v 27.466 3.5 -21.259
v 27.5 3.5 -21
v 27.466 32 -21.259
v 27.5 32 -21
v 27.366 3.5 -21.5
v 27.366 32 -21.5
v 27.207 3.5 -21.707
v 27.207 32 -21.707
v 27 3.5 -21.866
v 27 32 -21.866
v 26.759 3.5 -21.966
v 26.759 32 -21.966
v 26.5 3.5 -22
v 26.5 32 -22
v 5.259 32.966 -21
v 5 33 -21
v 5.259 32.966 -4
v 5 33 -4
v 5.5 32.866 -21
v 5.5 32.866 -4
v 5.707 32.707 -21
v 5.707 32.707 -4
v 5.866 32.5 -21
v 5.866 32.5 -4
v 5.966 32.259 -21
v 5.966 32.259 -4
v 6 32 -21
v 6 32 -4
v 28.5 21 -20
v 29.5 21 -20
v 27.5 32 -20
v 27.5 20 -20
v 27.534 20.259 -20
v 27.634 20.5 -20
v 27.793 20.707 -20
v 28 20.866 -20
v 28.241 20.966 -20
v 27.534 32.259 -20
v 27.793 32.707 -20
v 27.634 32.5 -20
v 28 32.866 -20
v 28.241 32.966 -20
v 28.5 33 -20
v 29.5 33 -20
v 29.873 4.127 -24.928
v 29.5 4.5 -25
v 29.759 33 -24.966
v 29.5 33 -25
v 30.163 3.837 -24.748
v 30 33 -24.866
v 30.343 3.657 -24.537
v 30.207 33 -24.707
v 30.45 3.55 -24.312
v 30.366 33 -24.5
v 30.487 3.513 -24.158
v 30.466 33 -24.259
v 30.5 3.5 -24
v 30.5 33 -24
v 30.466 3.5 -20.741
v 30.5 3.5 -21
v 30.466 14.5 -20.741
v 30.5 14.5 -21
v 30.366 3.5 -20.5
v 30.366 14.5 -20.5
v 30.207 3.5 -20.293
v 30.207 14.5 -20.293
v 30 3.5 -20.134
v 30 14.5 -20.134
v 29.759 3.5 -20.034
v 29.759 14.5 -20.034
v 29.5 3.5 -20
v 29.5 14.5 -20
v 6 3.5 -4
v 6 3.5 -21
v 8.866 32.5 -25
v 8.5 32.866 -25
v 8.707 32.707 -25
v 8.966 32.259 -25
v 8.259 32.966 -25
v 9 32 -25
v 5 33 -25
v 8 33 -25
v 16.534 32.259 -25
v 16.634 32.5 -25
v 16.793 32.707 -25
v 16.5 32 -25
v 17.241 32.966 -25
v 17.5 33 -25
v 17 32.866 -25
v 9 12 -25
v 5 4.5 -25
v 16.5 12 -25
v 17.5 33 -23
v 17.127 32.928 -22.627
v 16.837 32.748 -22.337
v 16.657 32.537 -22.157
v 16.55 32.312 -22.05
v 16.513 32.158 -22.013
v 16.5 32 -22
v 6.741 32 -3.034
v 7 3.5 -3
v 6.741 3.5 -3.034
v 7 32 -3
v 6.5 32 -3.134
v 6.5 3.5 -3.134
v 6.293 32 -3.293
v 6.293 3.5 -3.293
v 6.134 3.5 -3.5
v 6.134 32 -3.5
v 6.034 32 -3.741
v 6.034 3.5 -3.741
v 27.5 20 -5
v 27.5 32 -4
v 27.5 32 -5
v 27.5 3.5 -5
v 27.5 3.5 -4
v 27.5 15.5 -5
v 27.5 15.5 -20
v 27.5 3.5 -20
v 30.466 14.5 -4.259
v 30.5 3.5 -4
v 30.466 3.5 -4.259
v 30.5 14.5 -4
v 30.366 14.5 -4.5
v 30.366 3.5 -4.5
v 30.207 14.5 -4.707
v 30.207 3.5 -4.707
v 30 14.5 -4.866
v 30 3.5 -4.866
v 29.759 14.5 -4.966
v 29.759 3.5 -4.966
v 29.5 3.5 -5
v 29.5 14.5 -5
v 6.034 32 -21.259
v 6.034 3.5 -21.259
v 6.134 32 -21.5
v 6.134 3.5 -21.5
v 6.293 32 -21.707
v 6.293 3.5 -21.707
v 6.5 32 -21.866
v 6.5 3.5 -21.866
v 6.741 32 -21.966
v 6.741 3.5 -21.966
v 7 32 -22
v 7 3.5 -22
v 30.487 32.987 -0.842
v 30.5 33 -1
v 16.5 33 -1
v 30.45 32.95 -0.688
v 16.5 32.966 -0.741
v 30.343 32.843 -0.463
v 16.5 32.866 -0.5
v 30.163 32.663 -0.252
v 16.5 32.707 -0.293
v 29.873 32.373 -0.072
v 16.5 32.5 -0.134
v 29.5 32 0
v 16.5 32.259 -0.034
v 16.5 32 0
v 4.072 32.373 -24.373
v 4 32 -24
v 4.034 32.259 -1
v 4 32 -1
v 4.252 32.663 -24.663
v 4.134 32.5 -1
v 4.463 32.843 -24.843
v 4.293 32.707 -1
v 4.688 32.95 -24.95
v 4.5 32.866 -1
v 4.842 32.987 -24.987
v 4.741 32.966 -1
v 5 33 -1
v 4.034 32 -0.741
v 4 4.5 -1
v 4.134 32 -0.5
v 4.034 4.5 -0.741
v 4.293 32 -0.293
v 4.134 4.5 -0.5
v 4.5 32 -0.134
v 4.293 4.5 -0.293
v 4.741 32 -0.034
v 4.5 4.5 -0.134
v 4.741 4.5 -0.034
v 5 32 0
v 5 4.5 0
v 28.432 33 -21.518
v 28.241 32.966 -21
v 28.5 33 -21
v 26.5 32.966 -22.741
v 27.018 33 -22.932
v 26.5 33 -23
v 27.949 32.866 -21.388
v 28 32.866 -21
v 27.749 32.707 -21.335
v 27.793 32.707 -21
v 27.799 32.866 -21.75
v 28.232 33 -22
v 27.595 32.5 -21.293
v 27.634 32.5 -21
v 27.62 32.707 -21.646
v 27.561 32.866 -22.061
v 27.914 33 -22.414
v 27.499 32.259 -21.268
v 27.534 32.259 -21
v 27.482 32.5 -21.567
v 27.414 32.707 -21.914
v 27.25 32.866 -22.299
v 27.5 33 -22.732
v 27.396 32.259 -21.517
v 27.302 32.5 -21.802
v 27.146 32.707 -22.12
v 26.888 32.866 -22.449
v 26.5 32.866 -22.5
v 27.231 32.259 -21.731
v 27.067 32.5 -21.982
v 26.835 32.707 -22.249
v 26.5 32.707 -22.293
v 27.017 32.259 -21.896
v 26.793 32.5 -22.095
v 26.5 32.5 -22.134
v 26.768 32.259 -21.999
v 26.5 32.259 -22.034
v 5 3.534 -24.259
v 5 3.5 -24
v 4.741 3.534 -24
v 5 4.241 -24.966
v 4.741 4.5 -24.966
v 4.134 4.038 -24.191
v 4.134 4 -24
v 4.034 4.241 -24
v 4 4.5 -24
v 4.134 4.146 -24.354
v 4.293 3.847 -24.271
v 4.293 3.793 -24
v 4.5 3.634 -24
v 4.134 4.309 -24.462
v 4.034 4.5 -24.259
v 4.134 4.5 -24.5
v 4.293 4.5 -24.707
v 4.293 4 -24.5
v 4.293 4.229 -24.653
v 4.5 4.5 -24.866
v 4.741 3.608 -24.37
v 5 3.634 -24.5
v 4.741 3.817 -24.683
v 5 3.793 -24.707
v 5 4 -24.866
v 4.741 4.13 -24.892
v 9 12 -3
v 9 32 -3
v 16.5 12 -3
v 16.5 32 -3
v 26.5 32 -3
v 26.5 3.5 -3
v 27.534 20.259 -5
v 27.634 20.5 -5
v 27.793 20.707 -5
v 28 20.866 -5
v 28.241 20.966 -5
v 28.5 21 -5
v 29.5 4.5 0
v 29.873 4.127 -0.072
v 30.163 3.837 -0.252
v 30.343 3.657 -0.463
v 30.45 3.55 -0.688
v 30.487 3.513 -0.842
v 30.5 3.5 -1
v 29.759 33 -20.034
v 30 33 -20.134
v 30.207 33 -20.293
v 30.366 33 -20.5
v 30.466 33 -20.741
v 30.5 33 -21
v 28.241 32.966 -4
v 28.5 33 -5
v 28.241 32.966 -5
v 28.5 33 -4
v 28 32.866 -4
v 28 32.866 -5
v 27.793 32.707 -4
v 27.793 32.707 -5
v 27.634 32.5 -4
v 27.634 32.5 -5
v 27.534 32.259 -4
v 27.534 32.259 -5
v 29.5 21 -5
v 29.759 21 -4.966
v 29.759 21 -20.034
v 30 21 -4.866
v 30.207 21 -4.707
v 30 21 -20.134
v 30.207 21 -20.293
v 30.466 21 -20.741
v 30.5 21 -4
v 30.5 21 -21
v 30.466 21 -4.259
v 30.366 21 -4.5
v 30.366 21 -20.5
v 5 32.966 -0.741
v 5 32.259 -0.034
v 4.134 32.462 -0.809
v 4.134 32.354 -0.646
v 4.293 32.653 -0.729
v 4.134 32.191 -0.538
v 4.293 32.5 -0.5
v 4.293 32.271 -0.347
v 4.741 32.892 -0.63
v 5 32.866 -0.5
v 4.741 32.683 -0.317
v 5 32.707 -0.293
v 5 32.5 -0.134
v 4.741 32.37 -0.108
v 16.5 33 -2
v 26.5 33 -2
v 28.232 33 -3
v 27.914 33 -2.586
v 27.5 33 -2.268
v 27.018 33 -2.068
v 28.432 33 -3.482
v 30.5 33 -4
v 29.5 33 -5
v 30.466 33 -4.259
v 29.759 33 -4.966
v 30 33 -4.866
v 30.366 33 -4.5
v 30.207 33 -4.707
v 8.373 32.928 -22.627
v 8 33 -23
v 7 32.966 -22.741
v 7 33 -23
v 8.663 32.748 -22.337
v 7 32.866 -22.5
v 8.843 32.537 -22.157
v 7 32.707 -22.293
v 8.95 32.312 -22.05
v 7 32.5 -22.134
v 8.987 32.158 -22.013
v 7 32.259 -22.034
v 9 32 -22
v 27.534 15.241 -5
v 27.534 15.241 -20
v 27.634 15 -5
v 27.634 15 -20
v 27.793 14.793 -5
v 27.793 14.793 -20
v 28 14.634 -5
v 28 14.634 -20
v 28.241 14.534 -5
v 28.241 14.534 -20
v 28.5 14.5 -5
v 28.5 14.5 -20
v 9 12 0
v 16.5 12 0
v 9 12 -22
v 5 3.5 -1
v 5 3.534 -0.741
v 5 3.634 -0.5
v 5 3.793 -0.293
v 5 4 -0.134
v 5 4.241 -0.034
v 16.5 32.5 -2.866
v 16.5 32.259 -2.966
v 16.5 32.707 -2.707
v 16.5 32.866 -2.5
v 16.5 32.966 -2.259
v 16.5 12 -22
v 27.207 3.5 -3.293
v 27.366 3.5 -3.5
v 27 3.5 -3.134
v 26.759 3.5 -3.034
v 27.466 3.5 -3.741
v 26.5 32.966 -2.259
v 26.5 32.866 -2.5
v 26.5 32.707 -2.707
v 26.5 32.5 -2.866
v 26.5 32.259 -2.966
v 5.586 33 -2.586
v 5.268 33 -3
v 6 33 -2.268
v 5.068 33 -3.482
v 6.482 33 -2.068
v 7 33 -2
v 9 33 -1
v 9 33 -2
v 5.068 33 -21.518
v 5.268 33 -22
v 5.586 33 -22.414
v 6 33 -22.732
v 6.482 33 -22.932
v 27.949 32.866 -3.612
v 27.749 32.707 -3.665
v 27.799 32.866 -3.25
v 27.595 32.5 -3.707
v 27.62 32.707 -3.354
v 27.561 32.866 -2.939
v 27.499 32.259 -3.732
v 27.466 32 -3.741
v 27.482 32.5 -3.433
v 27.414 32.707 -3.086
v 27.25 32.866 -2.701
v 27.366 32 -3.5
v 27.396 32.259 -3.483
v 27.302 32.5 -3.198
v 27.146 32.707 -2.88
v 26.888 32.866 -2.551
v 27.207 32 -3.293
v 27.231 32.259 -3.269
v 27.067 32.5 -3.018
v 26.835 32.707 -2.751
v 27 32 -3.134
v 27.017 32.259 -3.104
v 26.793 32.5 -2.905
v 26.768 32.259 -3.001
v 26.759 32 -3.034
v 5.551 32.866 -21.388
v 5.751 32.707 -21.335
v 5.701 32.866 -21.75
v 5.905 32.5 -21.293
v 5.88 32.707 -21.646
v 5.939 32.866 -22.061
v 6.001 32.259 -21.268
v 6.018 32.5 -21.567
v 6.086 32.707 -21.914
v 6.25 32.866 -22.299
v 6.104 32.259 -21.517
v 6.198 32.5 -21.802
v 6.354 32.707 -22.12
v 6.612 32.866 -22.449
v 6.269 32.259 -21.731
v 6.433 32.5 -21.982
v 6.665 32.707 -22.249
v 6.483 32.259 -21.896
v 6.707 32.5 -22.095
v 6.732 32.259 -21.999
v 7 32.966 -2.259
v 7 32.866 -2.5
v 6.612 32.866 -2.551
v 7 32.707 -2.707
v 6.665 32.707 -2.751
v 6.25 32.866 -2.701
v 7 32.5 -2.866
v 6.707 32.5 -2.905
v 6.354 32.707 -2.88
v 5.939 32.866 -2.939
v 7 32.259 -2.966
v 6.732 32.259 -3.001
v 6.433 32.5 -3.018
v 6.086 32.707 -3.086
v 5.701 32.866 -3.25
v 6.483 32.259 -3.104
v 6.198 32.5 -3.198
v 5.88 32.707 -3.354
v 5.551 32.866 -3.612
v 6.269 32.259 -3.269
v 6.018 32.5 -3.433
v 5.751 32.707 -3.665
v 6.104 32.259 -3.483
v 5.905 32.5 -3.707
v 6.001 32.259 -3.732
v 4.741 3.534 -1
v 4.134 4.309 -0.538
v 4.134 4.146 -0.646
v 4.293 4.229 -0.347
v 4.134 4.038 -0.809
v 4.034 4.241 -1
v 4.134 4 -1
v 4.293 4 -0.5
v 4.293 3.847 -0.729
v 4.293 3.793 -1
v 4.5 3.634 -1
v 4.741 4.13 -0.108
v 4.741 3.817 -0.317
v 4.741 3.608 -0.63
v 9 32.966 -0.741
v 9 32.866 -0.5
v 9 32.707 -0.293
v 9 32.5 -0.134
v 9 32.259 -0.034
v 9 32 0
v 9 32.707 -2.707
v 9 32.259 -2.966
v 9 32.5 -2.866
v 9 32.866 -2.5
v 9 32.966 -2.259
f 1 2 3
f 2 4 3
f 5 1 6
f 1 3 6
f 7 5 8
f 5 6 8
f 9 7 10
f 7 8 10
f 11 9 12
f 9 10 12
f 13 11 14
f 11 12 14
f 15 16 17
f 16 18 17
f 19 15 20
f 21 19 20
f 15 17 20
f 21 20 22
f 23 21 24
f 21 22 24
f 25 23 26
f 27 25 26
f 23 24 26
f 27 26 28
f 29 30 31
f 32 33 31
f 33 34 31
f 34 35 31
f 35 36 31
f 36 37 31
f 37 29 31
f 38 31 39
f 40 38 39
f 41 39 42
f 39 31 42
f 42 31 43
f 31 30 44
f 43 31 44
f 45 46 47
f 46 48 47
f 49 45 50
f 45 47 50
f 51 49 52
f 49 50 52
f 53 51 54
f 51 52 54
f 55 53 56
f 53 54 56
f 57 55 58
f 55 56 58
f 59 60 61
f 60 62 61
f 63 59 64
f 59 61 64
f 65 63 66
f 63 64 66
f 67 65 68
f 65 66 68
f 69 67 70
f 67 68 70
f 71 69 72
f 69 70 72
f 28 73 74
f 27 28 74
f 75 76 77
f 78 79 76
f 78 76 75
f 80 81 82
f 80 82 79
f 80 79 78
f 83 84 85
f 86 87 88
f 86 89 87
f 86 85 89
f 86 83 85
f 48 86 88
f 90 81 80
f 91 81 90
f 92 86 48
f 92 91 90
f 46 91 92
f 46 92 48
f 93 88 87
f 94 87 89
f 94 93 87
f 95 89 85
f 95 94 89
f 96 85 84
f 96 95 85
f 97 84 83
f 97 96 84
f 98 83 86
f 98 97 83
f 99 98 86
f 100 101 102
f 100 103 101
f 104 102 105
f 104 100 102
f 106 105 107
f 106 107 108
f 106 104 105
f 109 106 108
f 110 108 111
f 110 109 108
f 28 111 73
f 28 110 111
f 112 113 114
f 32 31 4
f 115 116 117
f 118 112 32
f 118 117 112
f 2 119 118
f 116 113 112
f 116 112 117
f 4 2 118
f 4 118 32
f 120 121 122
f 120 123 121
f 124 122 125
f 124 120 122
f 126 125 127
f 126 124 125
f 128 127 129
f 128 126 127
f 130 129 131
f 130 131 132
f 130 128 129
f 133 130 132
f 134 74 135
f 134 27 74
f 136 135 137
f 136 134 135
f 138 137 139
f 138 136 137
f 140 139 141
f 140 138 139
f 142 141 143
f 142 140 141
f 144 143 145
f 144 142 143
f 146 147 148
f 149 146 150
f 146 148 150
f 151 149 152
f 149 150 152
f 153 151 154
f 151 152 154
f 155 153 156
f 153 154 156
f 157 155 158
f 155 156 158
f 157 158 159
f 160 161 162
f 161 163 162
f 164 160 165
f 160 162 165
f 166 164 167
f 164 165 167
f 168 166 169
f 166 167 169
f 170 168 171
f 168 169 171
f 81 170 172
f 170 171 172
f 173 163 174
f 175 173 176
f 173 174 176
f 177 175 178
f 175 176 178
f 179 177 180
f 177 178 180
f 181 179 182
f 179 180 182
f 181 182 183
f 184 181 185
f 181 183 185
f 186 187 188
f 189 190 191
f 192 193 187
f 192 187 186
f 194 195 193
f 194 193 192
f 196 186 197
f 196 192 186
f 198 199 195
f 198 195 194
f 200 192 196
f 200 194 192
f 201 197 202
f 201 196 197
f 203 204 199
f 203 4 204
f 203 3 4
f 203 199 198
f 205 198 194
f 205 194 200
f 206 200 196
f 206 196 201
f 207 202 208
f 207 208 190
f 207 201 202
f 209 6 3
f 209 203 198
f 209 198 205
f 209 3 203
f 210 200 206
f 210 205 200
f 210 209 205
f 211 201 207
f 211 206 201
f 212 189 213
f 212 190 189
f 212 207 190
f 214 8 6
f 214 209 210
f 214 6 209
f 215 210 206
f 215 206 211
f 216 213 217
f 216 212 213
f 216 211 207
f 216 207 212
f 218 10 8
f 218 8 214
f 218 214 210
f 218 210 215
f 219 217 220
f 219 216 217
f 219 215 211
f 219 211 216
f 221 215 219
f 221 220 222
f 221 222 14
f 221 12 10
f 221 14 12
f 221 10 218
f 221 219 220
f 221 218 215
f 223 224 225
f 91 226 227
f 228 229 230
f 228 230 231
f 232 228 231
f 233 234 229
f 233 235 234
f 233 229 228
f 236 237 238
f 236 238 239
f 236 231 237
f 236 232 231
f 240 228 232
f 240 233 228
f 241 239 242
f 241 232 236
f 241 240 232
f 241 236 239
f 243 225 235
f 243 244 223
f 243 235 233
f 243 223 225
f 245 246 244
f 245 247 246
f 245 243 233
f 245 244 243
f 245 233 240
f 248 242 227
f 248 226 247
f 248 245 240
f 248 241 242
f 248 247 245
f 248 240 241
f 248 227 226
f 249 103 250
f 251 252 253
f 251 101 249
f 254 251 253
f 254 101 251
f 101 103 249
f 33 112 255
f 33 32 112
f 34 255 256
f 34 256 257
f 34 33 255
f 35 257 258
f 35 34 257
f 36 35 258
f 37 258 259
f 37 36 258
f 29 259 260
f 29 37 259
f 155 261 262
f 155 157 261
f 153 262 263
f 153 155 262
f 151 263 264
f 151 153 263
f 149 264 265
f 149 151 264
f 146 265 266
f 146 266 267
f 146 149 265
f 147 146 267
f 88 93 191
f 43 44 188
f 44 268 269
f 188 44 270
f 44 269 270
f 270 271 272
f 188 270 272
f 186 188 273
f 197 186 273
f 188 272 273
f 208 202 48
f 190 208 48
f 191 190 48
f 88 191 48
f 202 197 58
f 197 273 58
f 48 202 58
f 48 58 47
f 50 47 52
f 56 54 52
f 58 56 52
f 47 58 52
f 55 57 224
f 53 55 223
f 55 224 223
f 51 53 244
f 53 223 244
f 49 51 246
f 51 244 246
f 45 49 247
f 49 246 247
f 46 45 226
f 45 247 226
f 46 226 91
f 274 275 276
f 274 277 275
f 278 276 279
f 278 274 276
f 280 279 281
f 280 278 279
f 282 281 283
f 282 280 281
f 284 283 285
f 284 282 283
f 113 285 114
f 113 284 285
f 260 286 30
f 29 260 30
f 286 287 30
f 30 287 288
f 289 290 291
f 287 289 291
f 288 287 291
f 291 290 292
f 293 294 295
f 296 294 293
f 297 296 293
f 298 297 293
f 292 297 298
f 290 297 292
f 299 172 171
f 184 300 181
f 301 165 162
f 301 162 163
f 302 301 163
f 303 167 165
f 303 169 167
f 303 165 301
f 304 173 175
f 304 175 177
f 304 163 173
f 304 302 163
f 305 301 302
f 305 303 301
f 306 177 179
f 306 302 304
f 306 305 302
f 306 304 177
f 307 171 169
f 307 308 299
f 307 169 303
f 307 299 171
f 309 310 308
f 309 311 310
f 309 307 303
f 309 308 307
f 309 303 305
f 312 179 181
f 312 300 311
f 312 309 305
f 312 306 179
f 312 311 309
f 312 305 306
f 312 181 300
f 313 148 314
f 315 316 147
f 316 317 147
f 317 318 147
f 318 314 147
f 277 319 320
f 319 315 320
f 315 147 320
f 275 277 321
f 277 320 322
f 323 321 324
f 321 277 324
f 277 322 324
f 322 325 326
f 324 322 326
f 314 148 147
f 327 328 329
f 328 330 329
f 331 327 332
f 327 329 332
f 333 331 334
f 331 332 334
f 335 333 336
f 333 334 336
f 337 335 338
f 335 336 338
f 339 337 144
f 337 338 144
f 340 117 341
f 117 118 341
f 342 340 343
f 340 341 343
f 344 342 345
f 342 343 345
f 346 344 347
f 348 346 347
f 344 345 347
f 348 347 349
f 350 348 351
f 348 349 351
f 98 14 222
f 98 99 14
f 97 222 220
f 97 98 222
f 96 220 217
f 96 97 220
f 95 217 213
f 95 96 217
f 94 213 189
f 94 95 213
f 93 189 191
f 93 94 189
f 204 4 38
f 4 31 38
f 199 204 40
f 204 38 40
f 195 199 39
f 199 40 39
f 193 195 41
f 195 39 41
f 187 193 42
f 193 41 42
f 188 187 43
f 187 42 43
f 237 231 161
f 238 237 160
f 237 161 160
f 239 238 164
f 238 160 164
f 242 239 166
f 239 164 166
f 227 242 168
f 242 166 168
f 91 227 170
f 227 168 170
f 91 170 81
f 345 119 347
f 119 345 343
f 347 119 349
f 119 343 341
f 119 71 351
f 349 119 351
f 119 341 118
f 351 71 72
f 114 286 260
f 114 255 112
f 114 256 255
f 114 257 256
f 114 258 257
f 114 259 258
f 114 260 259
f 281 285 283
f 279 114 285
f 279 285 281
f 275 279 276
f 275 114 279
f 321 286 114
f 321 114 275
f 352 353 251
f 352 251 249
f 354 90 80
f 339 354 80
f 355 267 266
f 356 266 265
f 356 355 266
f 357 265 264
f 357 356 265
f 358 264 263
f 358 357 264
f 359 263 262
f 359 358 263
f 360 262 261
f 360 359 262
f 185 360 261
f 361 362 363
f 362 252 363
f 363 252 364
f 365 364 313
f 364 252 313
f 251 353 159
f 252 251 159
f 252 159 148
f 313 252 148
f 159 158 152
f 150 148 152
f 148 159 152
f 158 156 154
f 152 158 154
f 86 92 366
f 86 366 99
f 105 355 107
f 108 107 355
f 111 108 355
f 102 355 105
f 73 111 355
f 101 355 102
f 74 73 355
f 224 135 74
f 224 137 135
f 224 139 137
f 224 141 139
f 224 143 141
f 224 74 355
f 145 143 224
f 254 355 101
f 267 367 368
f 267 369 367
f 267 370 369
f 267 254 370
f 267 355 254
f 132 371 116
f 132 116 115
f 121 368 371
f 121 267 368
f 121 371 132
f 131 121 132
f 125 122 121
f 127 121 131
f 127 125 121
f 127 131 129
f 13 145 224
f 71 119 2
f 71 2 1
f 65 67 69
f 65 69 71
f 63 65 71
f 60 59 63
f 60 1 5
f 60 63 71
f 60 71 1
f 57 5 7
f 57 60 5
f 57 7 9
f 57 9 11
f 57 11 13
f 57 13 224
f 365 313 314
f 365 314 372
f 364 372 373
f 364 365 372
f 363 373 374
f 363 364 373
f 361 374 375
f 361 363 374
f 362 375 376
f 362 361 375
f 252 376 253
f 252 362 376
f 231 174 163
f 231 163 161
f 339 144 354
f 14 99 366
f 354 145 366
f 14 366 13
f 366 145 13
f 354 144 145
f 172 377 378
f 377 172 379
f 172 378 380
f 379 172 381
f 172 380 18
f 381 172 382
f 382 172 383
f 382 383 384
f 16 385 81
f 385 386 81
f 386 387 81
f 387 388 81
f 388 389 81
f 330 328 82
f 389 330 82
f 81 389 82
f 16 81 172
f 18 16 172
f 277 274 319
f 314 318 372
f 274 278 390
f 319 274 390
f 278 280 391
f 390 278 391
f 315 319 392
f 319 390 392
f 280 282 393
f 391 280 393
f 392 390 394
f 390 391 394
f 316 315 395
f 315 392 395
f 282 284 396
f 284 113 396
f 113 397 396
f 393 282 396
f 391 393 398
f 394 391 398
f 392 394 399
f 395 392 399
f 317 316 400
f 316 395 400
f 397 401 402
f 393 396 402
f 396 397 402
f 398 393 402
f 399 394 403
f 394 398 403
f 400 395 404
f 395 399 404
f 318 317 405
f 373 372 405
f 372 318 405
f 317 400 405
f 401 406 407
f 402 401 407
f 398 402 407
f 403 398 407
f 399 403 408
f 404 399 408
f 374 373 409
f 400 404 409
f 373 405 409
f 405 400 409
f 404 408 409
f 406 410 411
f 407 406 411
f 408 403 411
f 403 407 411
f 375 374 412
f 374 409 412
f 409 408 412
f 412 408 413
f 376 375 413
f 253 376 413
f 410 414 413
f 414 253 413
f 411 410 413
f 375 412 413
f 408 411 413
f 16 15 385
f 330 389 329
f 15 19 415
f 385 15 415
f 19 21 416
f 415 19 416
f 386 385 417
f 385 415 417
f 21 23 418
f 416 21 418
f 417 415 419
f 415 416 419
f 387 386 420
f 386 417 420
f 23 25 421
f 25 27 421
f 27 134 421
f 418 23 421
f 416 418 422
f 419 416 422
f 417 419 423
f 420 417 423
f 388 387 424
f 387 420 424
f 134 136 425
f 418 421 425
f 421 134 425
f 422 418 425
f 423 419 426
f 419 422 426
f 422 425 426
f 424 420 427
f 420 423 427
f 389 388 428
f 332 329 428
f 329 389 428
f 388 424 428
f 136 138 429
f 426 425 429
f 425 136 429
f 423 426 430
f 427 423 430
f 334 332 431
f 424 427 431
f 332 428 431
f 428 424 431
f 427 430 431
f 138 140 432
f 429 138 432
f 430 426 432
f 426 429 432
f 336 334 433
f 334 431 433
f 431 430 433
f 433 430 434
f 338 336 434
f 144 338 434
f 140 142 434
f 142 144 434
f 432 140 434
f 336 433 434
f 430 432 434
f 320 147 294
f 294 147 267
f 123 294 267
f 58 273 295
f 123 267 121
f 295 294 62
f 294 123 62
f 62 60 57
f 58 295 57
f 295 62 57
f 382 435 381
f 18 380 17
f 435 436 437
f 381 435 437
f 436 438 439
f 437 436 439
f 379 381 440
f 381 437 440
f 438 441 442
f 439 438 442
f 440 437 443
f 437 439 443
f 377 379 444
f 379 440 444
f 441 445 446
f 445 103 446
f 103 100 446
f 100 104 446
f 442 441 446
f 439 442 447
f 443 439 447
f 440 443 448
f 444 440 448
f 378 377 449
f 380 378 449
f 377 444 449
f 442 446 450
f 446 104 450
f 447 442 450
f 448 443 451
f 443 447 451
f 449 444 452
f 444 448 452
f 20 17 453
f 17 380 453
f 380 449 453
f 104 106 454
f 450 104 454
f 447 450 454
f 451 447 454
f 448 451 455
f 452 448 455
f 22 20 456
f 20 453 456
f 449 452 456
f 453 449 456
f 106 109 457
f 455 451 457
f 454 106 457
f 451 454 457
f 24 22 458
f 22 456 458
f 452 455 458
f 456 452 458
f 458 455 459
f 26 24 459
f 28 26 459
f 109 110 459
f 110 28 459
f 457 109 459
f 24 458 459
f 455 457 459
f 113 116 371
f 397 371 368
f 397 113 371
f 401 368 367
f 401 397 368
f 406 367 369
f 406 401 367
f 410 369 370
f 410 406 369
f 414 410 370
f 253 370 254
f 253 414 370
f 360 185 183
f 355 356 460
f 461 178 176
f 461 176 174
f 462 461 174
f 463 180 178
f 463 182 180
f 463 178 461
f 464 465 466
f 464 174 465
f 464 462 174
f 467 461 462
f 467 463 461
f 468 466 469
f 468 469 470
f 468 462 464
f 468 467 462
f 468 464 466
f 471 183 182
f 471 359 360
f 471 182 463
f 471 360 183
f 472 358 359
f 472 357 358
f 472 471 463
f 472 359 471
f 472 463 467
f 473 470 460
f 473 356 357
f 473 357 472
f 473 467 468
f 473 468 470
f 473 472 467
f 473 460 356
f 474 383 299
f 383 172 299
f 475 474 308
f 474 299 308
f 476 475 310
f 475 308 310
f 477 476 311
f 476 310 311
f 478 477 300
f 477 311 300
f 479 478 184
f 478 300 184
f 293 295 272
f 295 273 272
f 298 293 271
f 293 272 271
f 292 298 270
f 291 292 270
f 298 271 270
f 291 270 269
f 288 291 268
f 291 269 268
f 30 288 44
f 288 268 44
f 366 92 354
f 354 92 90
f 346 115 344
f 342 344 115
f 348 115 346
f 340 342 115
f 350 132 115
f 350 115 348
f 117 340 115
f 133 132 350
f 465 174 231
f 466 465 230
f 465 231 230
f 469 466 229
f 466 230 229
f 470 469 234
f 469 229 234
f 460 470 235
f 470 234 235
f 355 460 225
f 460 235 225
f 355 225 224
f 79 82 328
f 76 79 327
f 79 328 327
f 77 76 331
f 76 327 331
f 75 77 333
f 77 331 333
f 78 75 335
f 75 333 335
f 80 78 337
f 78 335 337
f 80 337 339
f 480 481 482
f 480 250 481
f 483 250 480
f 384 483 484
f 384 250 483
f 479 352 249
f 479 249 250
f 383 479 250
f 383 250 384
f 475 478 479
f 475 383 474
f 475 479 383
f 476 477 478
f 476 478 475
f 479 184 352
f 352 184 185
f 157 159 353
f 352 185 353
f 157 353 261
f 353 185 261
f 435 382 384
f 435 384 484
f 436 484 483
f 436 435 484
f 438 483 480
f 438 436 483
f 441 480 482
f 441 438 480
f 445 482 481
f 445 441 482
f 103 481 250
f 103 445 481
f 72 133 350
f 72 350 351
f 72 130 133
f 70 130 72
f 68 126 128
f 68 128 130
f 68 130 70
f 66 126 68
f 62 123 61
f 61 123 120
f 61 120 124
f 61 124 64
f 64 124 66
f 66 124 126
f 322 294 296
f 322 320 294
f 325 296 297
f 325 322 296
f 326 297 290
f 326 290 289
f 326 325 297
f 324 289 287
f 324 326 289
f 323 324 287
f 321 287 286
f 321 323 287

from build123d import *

# Parameters (mm, degrees)
SKETCH_1_W          = 27.5
SKETCH_1_H          = 25
SKETCH_1_W_2        = 21.5
SKETCH_1_H_2        = 19
EXTRUDE_1_DEPTH     = 36
SKETCH_3_W          = 15
SKETCH_3_H          = 30
CUT_EXTRUDE_1_DEPTH = 24.5
CUT_EXTRUDE_2_REACH = 55.397
SKETCH_4_W          = 7.5
SKETCH_4_H          = 24
SKETCH_5_W          = 25
SKETCH_5_H          = 3
SKETCH_5_H_2        = 3.5
CUT_EXTRUDE_3_DEPTH = 52.742149163
SKETCH_6_W          = 15
SKETCH_6_H          = 6.5
EXTRUDE_2_DEPTH     = 3
FILLET_1_R          = 1
SKETCH_7_W          = 1
SKETCH_7_H          = 25
CUT_EXTRUDE_5_DEPTH = 50.249365478
FILLET_3_R          = 1


with BuildPart() as part:
    # 草图1 → 凸台-拉伸1 (new body)
    with BuildSketch(Plane(origin=(0, 0, 0), x_dir=(1, 0, 0), z_dir=(0, 1, 0))):
        with Locations((16.75, 12.5)):
            Rectangle(SKETCH_1_W, SKETCH_1_H)
        with Locations((16.75, 12.5)):
            Rectangle(SKETCH_1_W_2, SKETCH_1_H_2, mode=Mode.SUBTRACT)
    extrude(amount=EXTRUDE_1_DEPTH)

    # 草图3 → 切除-拉伸1 (cut)
    with BuildSketch(Plane(origin=(30.5, 0, 0), x_dir=(0, 0, -1), z_dir=(1, 0, 0))):
        with Locations((12.5, 18)):
            Rectangle(SKETCH_3_W, SKETCH_3_H)
    extrude(amount=-CUT_EXTRUDE_1_DEPTH, mode=Mode.SUBTRACT)

    # 草图4 → 切除-拉伸2 (cut, up to next)
    with BuildSketch(Plane(origin=(0, 0, -25), x_dir=(-1, 0, 0), z_dir=(0, 0, -1)), mode=Mode.PRIVATE) as cut_extrude_2_sk1:
        with Locations((-12.75, 24)):
            Rectangle(SKETCH_4_W, SKETCH_4_H)
    cut_extrude_2_tool1 = extrude(cut_extrude_2_sk1.sketch, amount=-CUT_EXTRUDE_2_REACH, mode=Mode.PRIVATE) & part.part
    cut_extrude_2 = cut_extrude_2_tool1.solids().sort_by_distance((12.75, 24, -25))[0]
    add(cut_extrude_2, mode=Mode.SUBTRACT)

    # 草图5 → 切除-拉伸3 (cut, through all)
    with BuildSketch(Plane(origin=(30.5, 0, 0), x_dir=(0, 0, -1), z_dir=(1, 0, 0))):
        with Locations((12.5, 34.5)):
            Rectangle(SKETCH_5_W, SKETCH_5_H)
        with Locations((12.5, 1.75)):
            Rectangle(SKETCH_5_W, SKETCH_5_H_2)
    extrude(amount=-CUT_EXTRUDE_3_DEPTH, mode=Mode.SUBTRACT)

    # 草图6 → 凸台-拉伸2 (add)
    with BuildSketch(Plane(origin=(30.5, 0, 0), x_dir=(0, 0, -1), z_dir=(1, 0, 0))):
        with Locations((12.5, 17.75)):
            Rectangle(SKETCH_6_W, SKETCH_6_H)
    extrude(amount=-EXTRUDE_2_DEPTH)

    # 圆角1
    fillet_1_edges = [part.edges().sort_by_distance(p)[0] for p in [
        (30.5, 9, -5),
        (30.5, 27, -20),
        (27.5, 14.5, -12.5),
        (27.5, 21, -12.5),
        (30.5, 27, -5),
        (16.5, 33, -23.5),
        (30.5, 9, -20),
        (6, 18.25, -3),
        (27.5, 18.25, -3),
        (6, 18.25, -22),
        (27.5, 18.25, -22),
        (30.5, 18.25, 0),
        (3, 18.25, 0),
        (3, 18.25, -25),
        (30.5, 18.25, -25),
        (3, 33, -12.5),
        (9, 33, -23.5),
        (27.5, 33, -21),
        (27.5, 33, -4),
        (16.75, 33, -3),
        (6, 33, -12.5),
        (7.5, 33, -22),
        (22, 33, -22),
        (16.75, 33, 0),
        (3, 3.5, -12.5),
        (16.75, 3.5, 0),
        (16.75, 3.5, -25),
    ]]
    fillet(fillet_1_edges, radius=FILLET_1_R)

    # 草图7 → 切除-拉伸5 (cut, through all)
    with BuildSketch(Plane(origin=(0, 33, 0), x_dir=(1, 0, 0), z_dir=(0, 1, 0))):
        with Locations((3.5, 12.5)):
            Rectangle(SKETCH_7_W, SKETCH_7_H)
    extrude(amount=-CUT_EXTRUDE_5_DEPTH, mode=Mode.SUBTRACT)

    # 圆角3
    fillet_3_edges = [part.edges().sort_by_distance(p)[0] for p in [
        (4, 33, -13),
        (4, 18.75, -25),
        (4, 3.5, -12.5),
        (4, 18.25, 0),
        (4, 32.707106781, -0.292893219),
        (4, 3.792893219, -24.707106781),
        (4, 3.792893219, -0.292893219),
    ]]
    fillet(fillet_3_edges, radius=FILLET_3_R - 0.0001)  # a hair under: the kernel refuses the full size

    # 镜向1: 切除-拉伸2 across plane
    add(cut_extrude_2.mirror(Plane(origin=(0, 0, -12.5), x_dir=(1, 0, 0), z_dir=(0, 0, -1))), mode=Mode.SUBTRACT)


solid = part.part
